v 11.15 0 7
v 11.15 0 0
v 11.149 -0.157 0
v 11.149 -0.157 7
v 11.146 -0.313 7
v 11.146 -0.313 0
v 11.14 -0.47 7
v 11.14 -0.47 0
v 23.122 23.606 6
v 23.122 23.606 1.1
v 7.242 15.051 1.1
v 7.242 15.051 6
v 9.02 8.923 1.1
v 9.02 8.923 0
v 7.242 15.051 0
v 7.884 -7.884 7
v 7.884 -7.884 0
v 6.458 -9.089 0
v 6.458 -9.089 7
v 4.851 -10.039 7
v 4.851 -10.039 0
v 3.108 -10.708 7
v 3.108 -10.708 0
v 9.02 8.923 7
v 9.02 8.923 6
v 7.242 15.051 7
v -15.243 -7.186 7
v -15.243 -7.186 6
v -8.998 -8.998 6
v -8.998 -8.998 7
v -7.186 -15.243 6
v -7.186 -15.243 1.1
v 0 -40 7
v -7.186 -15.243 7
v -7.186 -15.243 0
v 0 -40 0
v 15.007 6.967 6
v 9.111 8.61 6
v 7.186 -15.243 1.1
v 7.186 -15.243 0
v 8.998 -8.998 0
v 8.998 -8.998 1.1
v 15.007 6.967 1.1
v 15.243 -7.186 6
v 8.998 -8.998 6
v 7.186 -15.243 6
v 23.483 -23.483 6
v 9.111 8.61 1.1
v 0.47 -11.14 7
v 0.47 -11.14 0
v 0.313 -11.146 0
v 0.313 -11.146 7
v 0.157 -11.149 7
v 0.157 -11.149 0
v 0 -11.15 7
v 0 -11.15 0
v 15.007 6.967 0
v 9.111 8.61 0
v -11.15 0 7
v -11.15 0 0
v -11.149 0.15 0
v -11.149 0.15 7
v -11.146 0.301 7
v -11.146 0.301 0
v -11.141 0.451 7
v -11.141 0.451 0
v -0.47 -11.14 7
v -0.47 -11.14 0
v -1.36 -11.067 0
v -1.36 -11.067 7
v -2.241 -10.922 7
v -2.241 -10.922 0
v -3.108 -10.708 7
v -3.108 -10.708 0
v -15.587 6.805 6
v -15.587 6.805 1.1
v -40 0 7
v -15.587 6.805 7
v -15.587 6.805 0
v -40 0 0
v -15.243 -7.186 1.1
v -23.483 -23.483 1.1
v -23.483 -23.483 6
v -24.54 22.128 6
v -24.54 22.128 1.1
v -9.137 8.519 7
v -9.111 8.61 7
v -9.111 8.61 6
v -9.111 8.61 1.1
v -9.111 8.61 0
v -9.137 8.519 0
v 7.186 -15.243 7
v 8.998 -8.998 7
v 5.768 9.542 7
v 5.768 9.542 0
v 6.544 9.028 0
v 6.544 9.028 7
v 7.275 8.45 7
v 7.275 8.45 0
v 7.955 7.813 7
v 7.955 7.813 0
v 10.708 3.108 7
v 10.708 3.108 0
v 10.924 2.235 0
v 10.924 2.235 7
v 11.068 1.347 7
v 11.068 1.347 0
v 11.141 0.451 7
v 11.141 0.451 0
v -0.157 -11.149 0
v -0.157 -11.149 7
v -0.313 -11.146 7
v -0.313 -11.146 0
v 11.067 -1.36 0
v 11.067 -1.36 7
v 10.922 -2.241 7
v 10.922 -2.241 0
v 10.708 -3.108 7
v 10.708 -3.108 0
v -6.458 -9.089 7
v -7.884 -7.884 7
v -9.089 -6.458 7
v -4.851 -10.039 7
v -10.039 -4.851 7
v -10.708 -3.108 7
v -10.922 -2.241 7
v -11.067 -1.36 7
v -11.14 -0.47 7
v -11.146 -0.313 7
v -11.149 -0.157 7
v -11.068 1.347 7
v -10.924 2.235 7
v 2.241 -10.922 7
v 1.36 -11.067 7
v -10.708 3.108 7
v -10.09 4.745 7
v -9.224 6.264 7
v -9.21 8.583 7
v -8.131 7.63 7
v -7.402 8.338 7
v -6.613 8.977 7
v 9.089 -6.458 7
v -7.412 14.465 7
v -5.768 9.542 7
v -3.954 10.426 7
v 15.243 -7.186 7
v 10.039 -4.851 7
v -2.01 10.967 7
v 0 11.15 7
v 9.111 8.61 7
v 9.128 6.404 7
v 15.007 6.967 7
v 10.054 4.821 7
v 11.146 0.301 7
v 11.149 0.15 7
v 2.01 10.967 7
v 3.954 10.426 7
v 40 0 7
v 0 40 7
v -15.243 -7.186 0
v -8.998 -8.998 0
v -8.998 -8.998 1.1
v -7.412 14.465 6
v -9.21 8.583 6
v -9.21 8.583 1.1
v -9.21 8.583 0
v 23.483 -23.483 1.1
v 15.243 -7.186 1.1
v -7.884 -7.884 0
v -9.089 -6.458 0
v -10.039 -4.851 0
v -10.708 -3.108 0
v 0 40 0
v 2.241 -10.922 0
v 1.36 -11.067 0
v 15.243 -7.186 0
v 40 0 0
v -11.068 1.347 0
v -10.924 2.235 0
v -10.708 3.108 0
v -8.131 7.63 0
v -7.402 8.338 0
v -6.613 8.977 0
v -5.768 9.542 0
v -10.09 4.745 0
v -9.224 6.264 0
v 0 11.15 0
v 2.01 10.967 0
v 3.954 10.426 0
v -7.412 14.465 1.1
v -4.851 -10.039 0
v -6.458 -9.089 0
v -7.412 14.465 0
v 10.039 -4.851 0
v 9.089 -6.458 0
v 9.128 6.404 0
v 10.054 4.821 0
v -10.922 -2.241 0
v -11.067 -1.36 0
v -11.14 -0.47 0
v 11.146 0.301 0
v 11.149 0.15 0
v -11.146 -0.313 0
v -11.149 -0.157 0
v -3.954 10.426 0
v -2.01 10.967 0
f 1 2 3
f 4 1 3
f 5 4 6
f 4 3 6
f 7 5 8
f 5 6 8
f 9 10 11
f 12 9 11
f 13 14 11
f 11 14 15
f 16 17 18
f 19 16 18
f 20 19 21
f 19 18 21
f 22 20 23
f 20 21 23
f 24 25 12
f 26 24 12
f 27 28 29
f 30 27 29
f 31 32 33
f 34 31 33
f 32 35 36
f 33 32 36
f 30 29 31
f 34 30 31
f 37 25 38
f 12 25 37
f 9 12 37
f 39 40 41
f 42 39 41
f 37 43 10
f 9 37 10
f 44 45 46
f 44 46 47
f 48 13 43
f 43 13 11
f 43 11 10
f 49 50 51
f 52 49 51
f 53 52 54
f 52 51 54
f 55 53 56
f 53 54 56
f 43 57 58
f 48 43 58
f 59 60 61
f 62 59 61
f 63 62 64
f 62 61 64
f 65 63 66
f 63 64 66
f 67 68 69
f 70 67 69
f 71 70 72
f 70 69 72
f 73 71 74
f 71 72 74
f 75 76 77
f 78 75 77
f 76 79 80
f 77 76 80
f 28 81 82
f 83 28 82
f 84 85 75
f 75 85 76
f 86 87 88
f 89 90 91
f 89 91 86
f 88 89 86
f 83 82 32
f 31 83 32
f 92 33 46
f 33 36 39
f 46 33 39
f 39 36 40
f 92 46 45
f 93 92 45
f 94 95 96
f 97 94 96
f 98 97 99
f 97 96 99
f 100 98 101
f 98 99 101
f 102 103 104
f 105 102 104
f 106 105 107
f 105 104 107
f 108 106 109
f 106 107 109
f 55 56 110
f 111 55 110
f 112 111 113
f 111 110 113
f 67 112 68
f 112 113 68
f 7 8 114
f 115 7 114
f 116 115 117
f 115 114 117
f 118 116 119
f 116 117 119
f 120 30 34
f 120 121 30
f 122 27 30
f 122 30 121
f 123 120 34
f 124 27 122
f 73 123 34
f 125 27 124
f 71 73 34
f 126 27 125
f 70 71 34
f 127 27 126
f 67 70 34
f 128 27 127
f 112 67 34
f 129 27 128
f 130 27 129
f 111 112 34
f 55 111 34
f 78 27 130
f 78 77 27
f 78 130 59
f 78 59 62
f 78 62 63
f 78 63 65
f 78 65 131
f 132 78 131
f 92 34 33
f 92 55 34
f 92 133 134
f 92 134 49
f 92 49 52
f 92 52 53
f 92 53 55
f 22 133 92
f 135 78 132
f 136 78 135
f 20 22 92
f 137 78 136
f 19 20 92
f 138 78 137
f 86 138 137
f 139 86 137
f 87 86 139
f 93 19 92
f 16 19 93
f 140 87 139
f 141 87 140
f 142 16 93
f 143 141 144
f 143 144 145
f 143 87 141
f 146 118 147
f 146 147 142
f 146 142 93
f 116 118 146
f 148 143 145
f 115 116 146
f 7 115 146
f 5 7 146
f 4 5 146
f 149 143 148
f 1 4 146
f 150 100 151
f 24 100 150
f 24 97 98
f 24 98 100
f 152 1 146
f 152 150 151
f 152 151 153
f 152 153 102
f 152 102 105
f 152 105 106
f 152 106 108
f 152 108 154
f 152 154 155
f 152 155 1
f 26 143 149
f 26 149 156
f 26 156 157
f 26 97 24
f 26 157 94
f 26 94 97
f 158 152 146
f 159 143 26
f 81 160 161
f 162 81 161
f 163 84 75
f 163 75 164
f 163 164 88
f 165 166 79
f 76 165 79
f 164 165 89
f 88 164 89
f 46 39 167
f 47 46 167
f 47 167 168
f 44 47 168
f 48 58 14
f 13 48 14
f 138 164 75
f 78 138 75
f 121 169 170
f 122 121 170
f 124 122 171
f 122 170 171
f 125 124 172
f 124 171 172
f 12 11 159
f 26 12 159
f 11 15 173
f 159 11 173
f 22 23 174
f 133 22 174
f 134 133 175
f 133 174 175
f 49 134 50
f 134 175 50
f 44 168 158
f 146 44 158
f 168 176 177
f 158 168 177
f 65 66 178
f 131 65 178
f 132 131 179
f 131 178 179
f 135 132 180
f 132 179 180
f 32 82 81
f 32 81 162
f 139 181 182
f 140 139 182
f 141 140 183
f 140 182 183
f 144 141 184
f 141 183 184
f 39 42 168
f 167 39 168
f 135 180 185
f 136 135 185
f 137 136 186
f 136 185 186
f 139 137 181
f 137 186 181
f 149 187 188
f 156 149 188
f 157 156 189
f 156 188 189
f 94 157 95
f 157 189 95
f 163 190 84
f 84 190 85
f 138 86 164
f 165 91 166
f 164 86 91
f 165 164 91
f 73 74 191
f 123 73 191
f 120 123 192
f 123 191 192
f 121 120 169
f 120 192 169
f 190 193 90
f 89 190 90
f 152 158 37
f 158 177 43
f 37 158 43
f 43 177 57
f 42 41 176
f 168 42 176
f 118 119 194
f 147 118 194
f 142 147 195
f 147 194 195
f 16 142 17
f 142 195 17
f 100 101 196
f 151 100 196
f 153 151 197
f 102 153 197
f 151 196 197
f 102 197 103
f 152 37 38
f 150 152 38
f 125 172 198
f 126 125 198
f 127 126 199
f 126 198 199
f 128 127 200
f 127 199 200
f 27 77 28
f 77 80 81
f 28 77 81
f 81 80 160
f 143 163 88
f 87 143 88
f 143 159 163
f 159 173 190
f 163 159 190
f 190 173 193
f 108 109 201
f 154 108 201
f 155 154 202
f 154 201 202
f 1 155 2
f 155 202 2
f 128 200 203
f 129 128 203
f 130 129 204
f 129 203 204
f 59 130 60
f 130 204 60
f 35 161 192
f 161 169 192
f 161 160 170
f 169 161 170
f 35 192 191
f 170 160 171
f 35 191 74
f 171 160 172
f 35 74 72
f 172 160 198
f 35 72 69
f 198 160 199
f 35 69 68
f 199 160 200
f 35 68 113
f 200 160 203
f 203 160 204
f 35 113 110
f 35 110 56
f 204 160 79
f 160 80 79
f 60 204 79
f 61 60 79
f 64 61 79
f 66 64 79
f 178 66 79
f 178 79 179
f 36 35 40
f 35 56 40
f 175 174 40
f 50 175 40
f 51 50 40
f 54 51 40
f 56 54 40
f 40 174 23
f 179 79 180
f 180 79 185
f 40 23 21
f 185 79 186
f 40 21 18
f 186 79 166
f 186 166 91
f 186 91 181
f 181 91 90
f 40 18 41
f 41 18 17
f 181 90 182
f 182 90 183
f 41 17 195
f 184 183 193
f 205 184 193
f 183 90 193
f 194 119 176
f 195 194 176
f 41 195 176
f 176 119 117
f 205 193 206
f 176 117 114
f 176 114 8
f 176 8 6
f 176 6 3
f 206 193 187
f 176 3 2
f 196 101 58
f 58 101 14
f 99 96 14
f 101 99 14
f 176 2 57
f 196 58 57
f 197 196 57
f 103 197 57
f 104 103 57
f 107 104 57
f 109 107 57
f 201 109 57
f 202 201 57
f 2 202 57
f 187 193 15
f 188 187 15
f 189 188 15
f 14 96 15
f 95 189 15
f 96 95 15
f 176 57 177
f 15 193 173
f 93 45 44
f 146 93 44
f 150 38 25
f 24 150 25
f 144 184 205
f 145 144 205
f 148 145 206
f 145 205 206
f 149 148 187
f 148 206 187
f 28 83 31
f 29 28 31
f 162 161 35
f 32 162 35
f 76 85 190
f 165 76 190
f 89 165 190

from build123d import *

# Parameters (mm, degrees)
F1_DEPTH = 7
F2_START = 1.1
F2_DEPTH = 4.9


with BuildPart() as f1:
    # F0 (on Top) → F1 (new body)
    with BuildSketch(Plane.XY):
        Polygon((-7.4115242199, 14.465439185), (0, 11.15), (0, 40), align=None)
        Polygon((0, 40), (0, 11.15), (7.2415005954, 15.0512132379), align=None)
        Polygon((-40, 0), (-11.6101847588, 0), (-15.5867241284, 6.8052006492), align=None)
        Polygon((-15.2432164393, -7.1857707793), (-11.6101847588, 0), (-40, 0), align=None)
        Polygon((0, -40), (0, -11.6101847588), (-7.1857707793, -15.2432164393), align=None)
        Polygon((7.1857707793, -15.2432164393), (0, -11.6101847588), (0, -40), align=None)
        Polygon((40, 0), (11.6101847588, 0), (15.2432164393, -7.1857707793), align=None)
        Polygon((15.0074665088, 6.9666687107), (11.6101847588, 0), (40, 0), align=None)
        with BuildLine():
            ThreePointArc((-5.7679465413, 9.5421849016), (-2.9939220387, 10.7405274929), (0, 11.15))
            Line((0, 11.15), (-7.4115242199, 14.465439185))
            Line((-7.4115242199, 14.465439185), (-9.1110031263, 8.6103078786))
            Line((-9.1110031263, 8.6103078786), (-5.7679465413, 9.5421849016))
        make_face()
        Polygon((10.7080552853, 3.1080624202), (11.6101847588, 0), (15.0074665088, 6.9666687107), (9.1110031263, 8.6103078786), align=None)
        Polygon((-10.7080552332, -3.1080625996), (-11.6101847588, 0), (-15.2432164393, -7.1857707793), (-8.9983671347, -8.9983671347), align=None)
        Polygon((-7.1857707793, -15.2432164393), (0, -11.6101847588), (-3.1080626541, -10.7080552174), (-8.9983671347, -8.9983671347), align=None)
        Polygon((7.1857707793, -15.2432164393), (8.9983671347, -8.9983671347), (3.1080623688, -10.7080553002), (0, -11.6101847588), align=None)
        Polygon((15.2432164393, -7.1857707793), (11.6101847588, 0), (10.708055209, -3.1080626829), (8.9983671347, -8.9983671347), align=None)
        with BuildLine():
            Line((7.2415005954, 15.0512132379), (0, 11.15))
            ThreePointArc((0, 11.15), (2.9939220387, 10.7405274929), (5.7679465413, 9.5421849016))
            Line((5.7679465413, 9.5421849016), (8.8026408844, 8.6962638535))
            Line((8.8026408844, 8.6962638535), (9.02027697, 8.9228822539))
            Line((9.02027697, 8.9228822539), (7.2415005954, 15.0512132379))
        make_face()
        Polygon((-15.5867241284, 6.8052006492), (-11.6101847588, 0), (-10.7080552075, 3.108062688), (-9.1374538419, 8.5191785256), (-9.2095170056, 8.5828471347), align=None)
        with BuildLine():
            ThreePointArc((-10.7080552075, 3.108062688), (-9.6869346026, 5.5213945707), (-8.1307635844, 7.6297564532))
            Line((-8.1307635844, 7.6297564532), (-9.1374538419, 8.5191785256))
            Line((-9.1374538419, 8.5191785256), (-10.7080552075, 3.108062688))
        make_face()
        with BuildLine():
            ThreePointArc((5.7679465413, 9.5421849016), (6.9155239519, 8.7463151367), (7.9546122238, 7.813235205))
            Line((7.9546122238, 7.813235205), (8.8026408844, 8.6962638535))
            Line((8.8026408844, 8.6962638535), (5.7679465413, 9.5421849016))
        make_face()
        with BuildLine():
            ThreePointArc((-8.1307635844, 7.6297564532), (-7.0148329583, 8.6668690176), (-5.7679465413, 9.5421849016))
            Line((-5.7679465413, 9.5421849016), (-9.1110031263, 8.6103078786))
            Line((-9.1110031263, 8.6103078786), (-9.1374538419, 8.5191785256))
            Line((-9.1374538419, 8.5191785256), (-8.1307635844, 7.6297564532))
        make_face()
        with BuildLine():
            ThreePointArc((7.9546122238, 7.813235205), (9.6233285495, 5.631522674), (10.7080552853, 3.1080624202))
            Line((10.7080552853, 3.1080624202), (9.1110031263, 8.6103078786))
            Line((9.1110031263, 8.6103078786), (8.8026408844, 8.6962638535))
            Line((8.8026408844, 8.6962638535), (7.9546122238, 7.813235205))
        make_face()
        with BuildLine():
            Line((8.9983671347, -8.9983671347), (7.8842406102, -7.8842406102))
            ThreePointArc((7.8842406102, -7.8842406102), (5.6746069068, -9.5979860624), (3.1080623688, -10.7080553002))
            Line((3.1080623688, -10.7080553002), (8.9983671347, -8.9983671347))
        make_face()
        with BuildLine():
            Line((8.9983671347, -8.9983671347), (10.708055209, -3.1080626829))
            ThreePointArc((10.708055209, -3.1080626829), (9.5979859792, -5.6746070475), (7.8842406102, -7.8842406102))
            Line((7.8842406102, -7.8842406102), (8.9983671347, -8.9983671347))
        make_face()
        with BuildLine():
            Line((-8.9983671347, -8.9983671347), (-3.1080626541, -10.7080552174))
            ThreePointArc((-3.1080626541, -10.7080552174), (-5.6746070346, -9.5979859868), (-7.8842406102, -7.8842406102))
            Line((-7.8842406102, -7.8842406102), (-8.9983671347, -8.9983671347))
        make_face()
        with BuildLine():
            ThreePointArc((-7.8842406102, -7.8842406102), (-9.5979860012, -5.6746070102), (-10.7080552332, -3.1080625996))
            Line((-10.7080552332, -3.1080625996), (-8.9983671347, -8.9983671347))
            Line((-8.9983671347, -8.9983671347), (-7.8842406102, -7.8842406102))
        make_face()
        with BuildLine():
            ThreePointArc((-10.7080552332, -3.1080625996), (-11.0034097906, -1.8020746324), (-11.1400855815, -0.4700991772))
            Line((-11.1400855815, -0.4700991772), (-11.6101847588, 0))
            Line((-11.6101847588, 0), (-10.7080552332, -3.1080625996))
        make_face()
        with BuildLine():
            ThreePointArc((-11.1400855815, -0.4700991772), (-11.1475211198, -0.2351018567), (-11.15, 0))
            Line((-11.15, 0), (-11.6101847588, 0))
            Line((-11.6101847588, 0), (-11.1400855815, -0.4700991772))
        make_face()
        with BuildLine():
            Line((-11.6101847588, 0), (-11.15, 0))
            ThreePointArc((-11.15, 0), (-11.147721628, 0.22539411), (-11.1408874431, 0.4506961068))
            Line((-11.1408874431, 0.4506961068), (-11.6101847588, 0))
        make_face()
        with BuildLine():
            Line((-11.6101847588, 0), (-11.1408874431, 0.4506961068))
            ThreePointArc((-11.1408874431, 0.4506961068), (-11.0049749216, 1.7924918343), (-10.7080552075, 3.108062688))
            Line((-10.7080552075, 3.108062688), (-11.6101847588, 0))
        make_face()
        with BuildLine():
            Line((11.6101847588, 0), (11.1400855815, -0.4700991772))
            ThreePointArc((11.1400855815, -0.4700991772), (11.0034097836, -1.8020746752), (10.708055209, -3.1080626829))
            Line((10.708055209, -3.1080626829), (11.6101847588, 0))
        make_face()
        with BuildLine():
            Line((11.6101847588, 0), (11.15, 0))
            ThreePointArc((11.15, 0), (11.1475211198, -0.2351018567), (11.1400855815, -0.4700991772))
            Line((11.1400855815, -0.4700991772), (11.6101847588, 0))
        make_face()
        with BuildLine():
            ThreePointArc((11.1408874431, 0.4506961068), (11.147721628, 0.22539411), (11.15, 0))
            Line((11.15, 0), (11.6101847588, 0))
            Line((11.6101847588, 0), (11.1408874431, 0.4506961068))
        make_face()
        with BuildLine():
            ThreePointArc((10.7080552853, 3.1080624202), (11.004974944, 1.7924916967), (11.1408874431, 0.4506961068))
            Line((11.1408874431, 0.4506961068), (11.6101847588, 0))
            Line((11.6101847588, 0), (10.7080552853, 3.1080624202))
        make_face()
        Polygon((8.8026408844, 8.6962638535), (9.1110031263, 8.6103078786), (9.02027697, 8.9228822539), align=None)
        with BuildLine():
            Line((0, -11.6101847588), (-0.4700991772, -11.1400855815))
            ThreePointArc((-0.4700991772, -11.1400855815), (-1.8020746604, -11.003409786), (-3.1080626541, -10.7080552174))
            Line((-3.1080626541, -10.7080552174), (0, -11.6101847588))
        make_face()
        with BuildLine():
            ThreePointArc((0.4700991772, -11.1400855815), (0.2351018567, -11.1475211198), (0, -11.15))
            Line((0, -11.15), (0, -11.6101847588))
            Line((0, -11.6101847588), (0.4700991772, -11.1400855815))
        make_face()
        with BuildLine():
            ThreePointArc((3.1080623688, -10.7080553002), (1.8020745138, -11.00340981), (0.4700991772, -11.1400855815))
            Line((0.4700991772, -11.1400855815), (0, -11.6101847588))
            Line((0, -11.6101847588), (3.1080623688, -10.7080553002))
        make_face()
        with BuildLine():
            Line((0, -11.6101847588), (0, -11.15))
            ThreePointArc((0, -11.15), (-0.2351018567, -11.1475211198), (-0.4700991772, -11.1400855815))
            Line((-0.4700991772, -11.1400855815), (0, -11.6101847588))
        make_face()
    extrude(amount=F1_DEPTH)

    # F0 (on Top) → F2 (join)
    with BuildSketch(Plane.XY.offset(F2_START)):
        Polygon((-9.2095170056, 8.5828471347), (-24.540269553, 22.1277380295), (-15.5867241284, 6.8052006492), align=None)
        Polygon((-9.1110031263, 8.6103078786), (-7.4115242199, 14.465439185), (-24.540269553, 22.1277380295), (-9.2095170056, 8.5828471347), align=None)
        Polygon((23.1218005728, 23.6064064161), (7.2415005954, 15.0512132379), (9.02027697, 8.9228822539), align=None)
        Polygon((9.1110031263, 8.6103078786), (15.0074665088, 6.9666687107), (23.1218005728, 23.6064064161), (9.02027697, 8.9228822539), align=None)
        Polygon((23.482761909, -23.482761909), (15.2432164393, -7.1857707793), (8.9983671347, -8.9983671347), align=None)
        Polygon((23.482761909, -23.482761909), (8.9983671347, -8.9983671347), (7.1857707793, -15.2432164393), align=None)
        Polygon((-23.482761909, -23.482761909), (-7.1857707793, -15.2432164393), (-8.9983671347, -8.9983671347), align=None)
        Polygon((-8.9983671347, -8.9983671347), (-15.2432164393, -7.1857707793), (-23.482761909, -23.482761909), align=None)
    extrude(amount=F2_DEPTH)


solid = f1.part
